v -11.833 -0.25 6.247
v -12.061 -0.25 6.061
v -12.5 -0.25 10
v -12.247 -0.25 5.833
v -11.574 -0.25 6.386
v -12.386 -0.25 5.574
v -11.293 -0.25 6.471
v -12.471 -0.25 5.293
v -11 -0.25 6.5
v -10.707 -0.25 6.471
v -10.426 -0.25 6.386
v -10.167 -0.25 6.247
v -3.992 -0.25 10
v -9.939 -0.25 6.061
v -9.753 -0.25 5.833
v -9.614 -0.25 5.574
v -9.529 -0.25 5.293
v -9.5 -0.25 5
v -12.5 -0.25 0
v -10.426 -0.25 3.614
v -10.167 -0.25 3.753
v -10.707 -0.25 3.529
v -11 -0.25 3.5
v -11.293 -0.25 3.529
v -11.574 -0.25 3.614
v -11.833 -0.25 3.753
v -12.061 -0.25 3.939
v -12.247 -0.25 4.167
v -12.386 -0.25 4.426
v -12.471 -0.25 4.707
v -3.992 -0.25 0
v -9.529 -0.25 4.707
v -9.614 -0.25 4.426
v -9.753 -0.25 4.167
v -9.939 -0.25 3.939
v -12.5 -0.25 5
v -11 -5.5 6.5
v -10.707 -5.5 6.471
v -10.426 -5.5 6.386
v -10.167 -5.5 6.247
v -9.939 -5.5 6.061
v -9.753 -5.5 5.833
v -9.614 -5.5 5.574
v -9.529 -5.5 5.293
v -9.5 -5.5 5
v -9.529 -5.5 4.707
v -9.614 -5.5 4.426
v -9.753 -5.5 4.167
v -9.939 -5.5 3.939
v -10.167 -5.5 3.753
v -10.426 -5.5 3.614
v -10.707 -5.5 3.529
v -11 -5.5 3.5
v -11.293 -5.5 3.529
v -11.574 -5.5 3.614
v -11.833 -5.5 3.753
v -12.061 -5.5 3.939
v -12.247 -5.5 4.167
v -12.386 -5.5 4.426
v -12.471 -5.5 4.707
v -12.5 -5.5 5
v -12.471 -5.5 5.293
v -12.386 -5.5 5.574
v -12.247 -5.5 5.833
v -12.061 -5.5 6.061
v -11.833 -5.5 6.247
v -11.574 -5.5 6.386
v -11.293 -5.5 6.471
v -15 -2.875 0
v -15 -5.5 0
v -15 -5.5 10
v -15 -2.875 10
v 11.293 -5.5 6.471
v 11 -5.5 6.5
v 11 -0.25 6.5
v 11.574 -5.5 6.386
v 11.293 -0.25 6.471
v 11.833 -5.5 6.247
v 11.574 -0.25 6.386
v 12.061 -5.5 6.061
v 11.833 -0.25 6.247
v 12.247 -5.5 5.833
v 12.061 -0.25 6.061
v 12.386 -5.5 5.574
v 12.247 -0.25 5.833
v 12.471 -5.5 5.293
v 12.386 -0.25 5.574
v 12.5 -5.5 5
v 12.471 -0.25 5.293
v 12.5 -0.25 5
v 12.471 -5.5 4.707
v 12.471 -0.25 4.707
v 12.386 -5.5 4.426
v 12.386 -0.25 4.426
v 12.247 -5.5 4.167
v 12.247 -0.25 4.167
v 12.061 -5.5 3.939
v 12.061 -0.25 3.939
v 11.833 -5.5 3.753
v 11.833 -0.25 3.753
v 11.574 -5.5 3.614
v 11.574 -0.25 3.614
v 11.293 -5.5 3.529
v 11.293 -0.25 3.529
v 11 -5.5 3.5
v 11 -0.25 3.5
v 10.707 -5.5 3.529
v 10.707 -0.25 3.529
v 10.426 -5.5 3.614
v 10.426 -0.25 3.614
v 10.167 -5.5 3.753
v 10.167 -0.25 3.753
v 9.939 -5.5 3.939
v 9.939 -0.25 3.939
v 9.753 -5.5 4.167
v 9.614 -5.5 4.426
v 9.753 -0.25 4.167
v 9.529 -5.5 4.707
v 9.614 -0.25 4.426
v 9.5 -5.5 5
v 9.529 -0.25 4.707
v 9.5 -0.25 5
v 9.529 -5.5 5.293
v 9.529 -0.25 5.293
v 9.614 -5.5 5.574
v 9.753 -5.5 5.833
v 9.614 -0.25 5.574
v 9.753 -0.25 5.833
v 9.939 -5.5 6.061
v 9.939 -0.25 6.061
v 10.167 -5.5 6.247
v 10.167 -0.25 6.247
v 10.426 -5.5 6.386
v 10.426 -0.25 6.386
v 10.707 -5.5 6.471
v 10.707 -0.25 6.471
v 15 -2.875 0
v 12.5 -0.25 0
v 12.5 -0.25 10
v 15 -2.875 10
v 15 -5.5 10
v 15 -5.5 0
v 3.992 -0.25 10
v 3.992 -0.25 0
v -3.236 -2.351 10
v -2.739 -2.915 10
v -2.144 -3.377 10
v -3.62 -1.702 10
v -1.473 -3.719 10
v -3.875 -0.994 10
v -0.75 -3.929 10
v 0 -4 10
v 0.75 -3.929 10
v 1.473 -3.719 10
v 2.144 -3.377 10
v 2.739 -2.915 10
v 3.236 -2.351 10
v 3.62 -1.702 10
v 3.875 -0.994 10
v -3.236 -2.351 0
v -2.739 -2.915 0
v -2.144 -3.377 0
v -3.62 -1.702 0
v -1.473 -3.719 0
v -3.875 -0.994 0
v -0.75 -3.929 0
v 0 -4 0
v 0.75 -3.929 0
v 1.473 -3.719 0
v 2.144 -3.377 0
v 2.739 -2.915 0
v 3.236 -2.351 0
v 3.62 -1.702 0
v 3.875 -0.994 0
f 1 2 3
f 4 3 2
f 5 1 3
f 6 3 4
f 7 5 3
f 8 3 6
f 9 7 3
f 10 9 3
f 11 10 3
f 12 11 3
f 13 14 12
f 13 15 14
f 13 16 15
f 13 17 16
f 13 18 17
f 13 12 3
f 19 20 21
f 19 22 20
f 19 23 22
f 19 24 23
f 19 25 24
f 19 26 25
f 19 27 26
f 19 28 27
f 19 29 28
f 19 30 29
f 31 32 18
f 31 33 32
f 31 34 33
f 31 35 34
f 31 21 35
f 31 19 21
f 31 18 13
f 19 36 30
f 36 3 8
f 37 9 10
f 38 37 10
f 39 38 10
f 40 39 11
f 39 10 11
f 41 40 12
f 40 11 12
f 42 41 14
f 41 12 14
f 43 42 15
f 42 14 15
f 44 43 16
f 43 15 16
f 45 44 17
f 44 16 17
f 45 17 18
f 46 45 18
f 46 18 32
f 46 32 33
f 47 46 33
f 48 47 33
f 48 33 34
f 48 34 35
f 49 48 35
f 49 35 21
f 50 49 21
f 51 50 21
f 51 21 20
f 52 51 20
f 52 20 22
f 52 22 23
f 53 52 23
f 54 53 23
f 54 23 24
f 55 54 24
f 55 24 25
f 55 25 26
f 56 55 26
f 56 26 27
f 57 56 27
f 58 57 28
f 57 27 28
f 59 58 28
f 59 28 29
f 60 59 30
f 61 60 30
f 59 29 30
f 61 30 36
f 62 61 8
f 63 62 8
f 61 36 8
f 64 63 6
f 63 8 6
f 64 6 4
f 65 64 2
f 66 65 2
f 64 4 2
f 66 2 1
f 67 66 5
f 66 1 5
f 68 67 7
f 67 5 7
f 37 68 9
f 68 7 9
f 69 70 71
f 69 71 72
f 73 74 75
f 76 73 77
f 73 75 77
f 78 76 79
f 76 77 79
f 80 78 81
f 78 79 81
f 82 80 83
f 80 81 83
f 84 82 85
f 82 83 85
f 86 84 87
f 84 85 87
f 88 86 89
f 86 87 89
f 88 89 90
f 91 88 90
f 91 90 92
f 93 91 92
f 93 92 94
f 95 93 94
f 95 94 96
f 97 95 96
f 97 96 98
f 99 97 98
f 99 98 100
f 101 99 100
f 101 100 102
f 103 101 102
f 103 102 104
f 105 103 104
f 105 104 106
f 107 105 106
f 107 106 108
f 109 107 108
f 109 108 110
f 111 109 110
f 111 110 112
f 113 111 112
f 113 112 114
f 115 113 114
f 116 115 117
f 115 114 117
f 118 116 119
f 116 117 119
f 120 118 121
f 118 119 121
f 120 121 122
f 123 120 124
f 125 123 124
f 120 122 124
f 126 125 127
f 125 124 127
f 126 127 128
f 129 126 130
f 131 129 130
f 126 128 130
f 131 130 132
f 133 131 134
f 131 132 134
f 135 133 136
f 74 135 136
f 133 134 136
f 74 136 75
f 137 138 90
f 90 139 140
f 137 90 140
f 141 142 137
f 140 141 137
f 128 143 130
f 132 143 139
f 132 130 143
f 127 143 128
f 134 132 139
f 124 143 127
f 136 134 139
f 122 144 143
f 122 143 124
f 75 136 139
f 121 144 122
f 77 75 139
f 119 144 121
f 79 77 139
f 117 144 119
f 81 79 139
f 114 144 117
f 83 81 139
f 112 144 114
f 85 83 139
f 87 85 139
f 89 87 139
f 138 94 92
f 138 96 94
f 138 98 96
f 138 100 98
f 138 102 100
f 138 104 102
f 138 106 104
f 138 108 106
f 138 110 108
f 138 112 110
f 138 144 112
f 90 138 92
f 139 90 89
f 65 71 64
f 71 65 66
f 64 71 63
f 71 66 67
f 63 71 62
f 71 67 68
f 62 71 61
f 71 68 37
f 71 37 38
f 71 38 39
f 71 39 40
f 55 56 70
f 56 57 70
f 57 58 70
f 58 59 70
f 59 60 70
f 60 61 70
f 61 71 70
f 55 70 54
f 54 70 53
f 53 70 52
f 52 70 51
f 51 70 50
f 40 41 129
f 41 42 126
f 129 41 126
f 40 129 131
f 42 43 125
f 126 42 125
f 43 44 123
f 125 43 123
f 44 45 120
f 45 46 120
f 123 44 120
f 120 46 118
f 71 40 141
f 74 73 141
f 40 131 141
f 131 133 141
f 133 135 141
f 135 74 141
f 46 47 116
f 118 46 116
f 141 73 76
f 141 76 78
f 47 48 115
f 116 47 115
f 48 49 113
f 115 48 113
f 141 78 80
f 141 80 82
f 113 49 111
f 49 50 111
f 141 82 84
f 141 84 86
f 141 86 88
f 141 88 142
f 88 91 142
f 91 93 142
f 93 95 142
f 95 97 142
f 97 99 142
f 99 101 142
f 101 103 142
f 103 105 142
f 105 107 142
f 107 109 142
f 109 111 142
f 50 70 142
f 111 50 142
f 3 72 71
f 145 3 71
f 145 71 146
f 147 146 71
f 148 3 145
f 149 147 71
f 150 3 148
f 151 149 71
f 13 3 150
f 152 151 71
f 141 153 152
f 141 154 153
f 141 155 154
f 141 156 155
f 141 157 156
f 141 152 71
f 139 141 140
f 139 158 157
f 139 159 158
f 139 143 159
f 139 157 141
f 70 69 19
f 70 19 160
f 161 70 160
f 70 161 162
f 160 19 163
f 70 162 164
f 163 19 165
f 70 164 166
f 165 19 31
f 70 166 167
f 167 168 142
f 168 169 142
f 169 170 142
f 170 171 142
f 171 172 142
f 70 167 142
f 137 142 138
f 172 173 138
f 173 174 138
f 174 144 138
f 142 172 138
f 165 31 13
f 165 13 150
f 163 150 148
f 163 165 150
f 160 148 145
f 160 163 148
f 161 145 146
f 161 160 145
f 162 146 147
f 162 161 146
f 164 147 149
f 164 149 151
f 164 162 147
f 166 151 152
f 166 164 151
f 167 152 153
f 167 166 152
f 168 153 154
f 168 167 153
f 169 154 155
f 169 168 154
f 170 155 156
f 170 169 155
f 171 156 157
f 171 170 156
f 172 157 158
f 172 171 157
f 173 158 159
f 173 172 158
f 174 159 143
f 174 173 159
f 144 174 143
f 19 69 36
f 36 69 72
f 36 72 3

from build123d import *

# Parameters (mm, degrees)
SKETCH1_W           = 30
SKETCH1_H           = 11
SKETCH1_R           = 4
BOSS_EXTRUDE1_DEPTH = 10
SKETCH2_R           = 1.5
CUT_EXTRUDE1_DEPTH  = 17
CUT_EXTRUDE2_START  = -17
CUT_EXTRUDE2_DEPTH  = 17
CUT_EXTRUDE3_DEPTH  = 17


with BuildPart() as part:
    # Sketch1 → Boss-Extrude1 (new body)
    with BuildSketch(Plane.XY):
        Rectangle(SKETCH1_W, SKETCH1_H)
        Circle(SKETCH1_R, mode=Mode.SUBTRACT)
    extrude(amount=BOSS_EXTRUDE1_DEPTH)

    # Sketch2 → Cut-Extrude1 (cut)
    with BuildSketch(Plane(origin=(0, 5.5, 0), x_dir=(1, 0, 0), z_dir=(0, 1, 0))):
        with Locations(Location((-11, -5, 0), (0, 0, 270))):
            Circle(SKETCH2_R)
        with Locations(Location((11, -5, 0), (0, 0, 270))):
            Circle(SKETCH2_R)
    extrude(amount=-CUT_EXTRUDE1_DEPTH, mode=Mode.SUBTRACT)

    # Sketch3 → Cut-Extrude2 (cut)
    with BuildSketch(Plane.XY.offset(10).offset(CUT_EXTRUDE2_START)):
        with BuildLine():
            Line((3.992179856, -0.25), (15, -0.25))
            Line((15, -0.25), (15, 5.5))
            Line((15, 5.5), (-15, 5.5))
            Line((-15, 5.5), (-15, -0.25))
            Line((-15, -0.25), (-3.992179856, -0.25))
            ThreePointArc((-3.992179856, -0.25), (0, 4), (3.992179856, -0.25))
        make_face()
    extrude(amount=CUT_EXTRUDE2_DEPTH, mode=Mode.SUBTRACT)

    # Sketch4 → Cut-Extrude3 (cut)
    with BuildSketch(Plane.XY.offset(10)):
        Polygon((-15, -2.875), (-12.5, -0.25), (-15, -0.25), align=None)
        Polygon((15, -0.25), (12.5, -0.25), (15, -2.875), align=None)
    extrude(amount=-CUT_EXTRUDE3_DEPTH, mode=Mode.SUBTRACT)


solid = part.part
